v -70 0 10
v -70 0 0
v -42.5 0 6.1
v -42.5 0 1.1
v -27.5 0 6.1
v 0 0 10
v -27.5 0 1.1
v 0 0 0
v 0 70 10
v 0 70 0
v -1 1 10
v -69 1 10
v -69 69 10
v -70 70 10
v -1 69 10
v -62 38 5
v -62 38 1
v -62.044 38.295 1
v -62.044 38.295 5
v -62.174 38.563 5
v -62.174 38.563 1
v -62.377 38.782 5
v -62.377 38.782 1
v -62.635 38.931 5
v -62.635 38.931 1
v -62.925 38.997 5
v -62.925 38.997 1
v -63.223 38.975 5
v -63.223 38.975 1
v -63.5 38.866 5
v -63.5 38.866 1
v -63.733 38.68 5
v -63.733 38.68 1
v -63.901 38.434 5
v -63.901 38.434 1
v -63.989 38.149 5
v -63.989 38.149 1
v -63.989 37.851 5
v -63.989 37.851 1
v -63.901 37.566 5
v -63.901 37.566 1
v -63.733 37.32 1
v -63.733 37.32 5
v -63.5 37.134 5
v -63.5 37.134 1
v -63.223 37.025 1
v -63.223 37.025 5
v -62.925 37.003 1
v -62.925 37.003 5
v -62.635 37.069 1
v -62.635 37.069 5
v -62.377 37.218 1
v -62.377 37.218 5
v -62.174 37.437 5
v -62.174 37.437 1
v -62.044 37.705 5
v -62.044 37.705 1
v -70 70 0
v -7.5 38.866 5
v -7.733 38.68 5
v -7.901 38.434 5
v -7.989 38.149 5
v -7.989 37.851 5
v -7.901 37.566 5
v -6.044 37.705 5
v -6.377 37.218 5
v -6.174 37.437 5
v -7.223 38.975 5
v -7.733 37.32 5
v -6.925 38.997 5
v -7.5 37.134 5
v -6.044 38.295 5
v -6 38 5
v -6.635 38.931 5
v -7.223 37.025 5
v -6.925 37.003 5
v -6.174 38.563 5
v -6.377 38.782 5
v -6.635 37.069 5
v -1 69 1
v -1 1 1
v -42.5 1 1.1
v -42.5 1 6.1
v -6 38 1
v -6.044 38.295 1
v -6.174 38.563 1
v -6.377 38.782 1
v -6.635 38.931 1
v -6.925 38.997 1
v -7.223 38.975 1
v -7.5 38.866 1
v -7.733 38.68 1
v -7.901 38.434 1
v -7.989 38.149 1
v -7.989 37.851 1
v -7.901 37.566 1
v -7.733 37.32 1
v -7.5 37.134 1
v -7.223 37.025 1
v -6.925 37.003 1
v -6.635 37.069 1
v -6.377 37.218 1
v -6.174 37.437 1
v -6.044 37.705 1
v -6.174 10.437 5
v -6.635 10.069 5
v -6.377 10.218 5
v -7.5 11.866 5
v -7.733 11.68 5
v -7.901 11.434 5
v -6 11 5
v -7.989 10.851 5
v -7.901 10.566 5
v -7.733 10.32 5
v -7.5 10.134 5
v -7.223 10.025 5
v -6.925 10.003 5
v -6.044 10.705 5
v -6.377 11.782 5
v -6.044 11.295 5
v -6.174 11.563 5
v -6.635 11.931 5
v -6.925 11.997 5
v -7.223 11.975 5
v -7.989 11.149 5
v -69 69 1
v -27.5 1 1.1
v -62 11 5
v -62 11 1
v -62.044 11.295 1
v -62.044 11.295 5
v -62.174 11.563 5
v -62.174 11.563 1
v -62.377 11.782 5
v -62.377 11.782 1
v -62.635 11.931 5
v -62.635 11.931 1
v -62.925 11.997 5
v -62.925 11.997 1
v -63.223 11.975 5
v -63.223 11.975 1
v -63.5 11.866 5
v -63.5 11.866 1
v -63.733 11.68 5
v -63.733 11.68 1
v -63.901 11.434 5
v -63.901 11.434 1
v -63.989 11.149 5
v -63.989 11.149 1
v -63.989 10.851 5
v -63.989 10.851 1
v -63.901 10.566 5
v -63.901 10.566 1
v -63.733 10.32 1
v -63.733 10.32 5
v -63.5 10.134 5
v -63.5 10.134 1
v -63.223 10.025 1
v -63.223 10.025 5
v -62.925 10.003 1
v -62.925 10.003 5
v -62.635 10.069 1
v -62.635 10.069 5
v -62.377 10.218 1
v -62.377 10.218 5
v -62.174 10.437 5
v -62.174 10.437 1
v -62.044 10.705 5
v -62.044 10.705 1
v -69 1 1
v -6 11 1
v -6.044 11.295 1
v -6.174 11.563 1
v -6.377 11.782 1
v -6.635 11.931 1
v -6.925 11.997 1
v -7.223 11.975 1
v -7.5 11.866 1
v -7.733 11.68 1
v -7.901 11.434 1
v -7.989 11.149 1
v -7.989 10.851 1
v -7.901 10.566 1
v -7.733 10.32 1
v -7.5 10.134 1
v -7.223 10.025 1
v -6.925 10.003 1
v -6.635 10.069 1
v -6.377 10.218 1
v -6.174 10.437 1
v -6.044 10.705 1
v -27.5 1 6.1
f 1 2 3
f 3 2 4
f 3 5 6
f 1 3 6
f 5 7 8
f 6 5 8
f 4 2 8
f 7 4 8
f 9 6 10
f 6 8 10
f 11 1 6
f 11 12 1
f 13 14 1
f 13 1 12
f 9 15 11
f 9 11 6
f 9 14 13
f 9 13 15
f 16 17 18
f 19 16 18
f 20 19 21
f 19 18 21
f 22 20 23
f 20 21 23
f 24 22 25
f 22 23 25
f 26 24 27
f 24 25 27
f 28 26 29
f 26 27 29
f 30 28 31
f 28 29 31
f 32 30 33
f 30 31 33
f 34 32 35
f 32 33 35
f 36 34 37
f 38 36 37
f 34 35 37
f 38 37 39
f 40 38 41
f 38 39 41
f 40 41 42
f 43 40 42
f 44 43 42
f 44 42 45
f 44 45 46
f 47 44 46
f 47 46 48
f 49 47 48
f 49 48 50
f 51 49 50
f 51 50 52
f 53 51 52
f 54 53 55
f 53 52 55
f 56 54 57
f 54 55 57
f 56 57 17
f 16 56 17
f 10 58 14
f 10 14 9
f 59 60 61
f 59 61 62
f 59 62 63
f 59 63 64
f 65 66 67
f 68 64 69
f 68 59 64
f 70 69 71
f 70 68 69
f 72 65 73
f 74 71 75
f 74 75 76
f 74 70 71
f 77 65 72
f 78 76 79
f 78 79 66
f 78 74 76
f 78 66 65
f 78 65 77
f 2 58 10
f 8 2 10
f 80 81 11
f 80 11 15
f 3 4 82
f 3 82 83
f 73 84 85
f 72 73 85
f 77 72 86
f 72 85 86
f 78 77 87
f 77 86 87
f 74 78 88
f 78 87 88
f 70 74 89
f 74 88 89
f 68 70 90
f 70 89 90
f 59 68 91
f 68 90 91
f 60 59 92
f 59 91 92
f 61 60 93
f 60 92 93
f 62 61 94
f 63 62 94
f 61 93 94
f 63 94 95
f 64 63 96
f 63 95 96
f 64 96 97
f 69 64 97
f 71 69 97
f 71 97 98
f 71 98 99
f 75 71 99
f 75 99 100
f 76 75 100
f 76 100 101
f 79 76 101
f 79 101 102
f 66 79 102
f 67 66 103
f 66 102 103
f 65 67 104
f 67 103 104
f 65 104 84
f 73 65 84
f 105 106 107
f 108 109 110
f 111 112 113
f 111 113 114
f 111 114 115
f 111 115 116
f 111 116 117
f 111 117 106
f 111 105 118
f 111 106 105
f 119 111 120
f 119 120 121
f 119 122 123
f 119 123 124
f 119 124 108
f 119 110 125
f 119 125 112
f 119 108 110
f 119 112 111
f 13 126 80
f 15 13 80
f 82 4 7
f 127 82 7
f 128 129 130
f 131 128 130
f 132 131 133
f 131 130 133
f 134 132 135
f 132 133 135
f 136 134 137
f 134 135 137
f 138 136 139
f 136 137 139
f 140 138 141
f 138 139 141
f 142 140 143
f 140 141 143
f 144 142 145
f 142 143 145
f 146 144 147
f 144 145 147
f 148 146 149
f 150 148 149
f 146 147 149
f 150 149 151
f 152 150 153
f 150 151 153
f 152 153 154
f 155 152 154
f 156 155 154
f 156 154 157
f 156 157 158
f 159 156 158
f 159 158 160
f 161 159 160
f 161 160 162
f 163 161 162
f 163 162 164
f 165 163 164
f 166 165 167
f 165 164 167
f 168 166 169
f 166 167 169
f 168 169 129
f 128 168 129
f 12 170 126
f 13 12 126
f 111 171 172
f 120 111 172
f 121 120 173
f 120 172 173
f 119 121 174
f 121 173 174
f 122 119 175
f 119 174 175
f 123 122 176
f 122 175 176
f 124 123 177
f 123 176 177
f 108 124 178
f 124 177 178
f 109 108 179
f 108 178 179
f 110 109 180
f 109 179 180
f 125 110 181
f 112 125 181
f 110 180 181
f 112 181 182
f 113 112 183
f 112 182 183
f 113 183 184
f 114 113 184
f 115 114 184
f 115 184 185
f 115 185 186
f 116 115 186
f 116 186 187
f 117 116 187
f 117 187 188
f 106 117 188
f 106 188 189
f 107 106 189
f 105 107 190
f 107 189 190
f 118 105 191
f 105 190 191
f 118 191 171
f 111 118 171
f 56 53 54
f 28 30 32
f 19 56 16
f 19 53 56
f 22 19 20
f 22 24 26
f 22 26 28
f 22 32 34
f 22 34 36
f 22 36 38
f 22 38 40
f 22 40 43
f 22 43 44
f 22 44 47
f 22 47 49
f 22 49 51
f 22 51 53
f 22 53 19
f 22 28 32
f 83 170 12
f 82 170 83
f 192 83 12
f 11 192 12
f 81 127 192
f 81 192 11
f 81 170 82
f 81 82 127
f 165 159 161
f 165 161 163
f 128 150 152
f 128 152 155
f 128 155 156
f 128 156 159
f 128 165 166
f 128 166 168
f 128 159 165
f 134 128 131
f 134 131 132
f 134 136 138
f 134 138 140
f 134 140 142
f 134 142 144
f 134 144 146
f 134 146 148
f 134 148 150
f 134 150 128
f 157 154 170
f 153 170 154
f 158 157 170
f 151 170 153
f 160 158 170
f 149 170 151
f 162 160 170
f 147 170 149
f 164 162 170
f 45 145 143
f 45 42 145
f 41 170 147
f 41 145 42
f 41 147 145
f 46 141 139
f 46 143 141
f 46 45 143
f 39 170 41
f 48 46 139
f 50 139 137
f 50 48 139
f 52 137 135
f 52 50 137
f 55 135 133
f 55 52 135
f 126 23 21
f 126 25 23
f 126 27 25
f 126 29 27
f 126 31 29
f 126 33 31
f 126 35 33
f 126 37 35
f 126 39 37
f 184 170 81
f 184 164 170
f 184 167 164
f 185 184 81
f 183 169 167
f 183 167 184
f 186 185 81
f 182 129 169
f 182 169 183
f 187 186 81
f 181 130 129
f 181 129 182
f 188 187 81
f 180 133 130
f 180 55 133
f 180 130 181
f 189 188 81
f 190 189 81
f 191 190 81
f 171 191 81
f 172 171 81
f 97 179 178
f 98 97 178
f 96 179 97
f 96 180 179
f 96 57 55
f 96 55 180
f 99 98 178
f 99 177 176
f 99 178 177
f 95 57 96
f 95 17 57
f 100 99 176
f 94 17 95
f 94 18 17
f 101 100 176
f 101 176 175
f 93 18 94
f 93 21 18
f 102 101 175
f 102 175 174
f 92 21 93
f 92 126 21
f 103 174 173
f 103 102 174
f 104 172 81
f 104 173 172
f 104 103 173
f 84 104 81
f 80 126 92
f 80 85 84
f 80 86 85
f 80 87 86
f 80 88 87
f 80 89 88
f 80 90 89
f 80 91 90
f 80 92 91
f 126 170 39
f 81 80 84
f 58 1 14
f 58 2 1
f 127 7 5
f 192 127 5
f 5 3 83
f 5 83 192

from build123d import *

# Parameters (mm, degrees)
F0_W     = 70
F0_H     = 70
F1_DEPTH = 1
F2_W     = 70
F2_H     = 70
F2_W_2   = 68
F2_H_2   = 68
F3_DEPTH = 9
F4_W     = 15
F4_H     = 5
F5_DEPTH = 1
F6_R     = 1
F7_DEPTH = 4


with BuildPart() as f1:
    # F0 (on Top) → F1 (new body)
    with BuildSketch(Plane.XY):
        with Locations((-35, 35)):
            Rectangle(F0_W, F0_H)
    extrude(amount=F1_DEPTH)

    # F2 (on face) → F3 (join)
    with BuildSketch(Plane.XY.offset(1)):
        with Locations((-35, 35)):
            Rectangle(F2_W, F2_H)
        with Locations((-35, 35)):
            Rectangle(F2_W_2, F2_H_2, mode=Mode.SUBTRACT)
    extrude(amount=F3_DEPTH)

    # F4 (on face) → F5 (cut)
    with BuildSketch(Plane.XZ):
        with Locations((-35, 3.6)):
            Rectangle(F4_W, F4_H)
    extrude(amount=-F5_DEPTH, mode=Mode.SUBTRACT)

    # F6 (on face) → F7 (join)
    with BuildSketch(Plane.XY.offset(1)):
        with Locations((-63, 38)):
            Circle(F6_R)
        with Locations((-7, 38)):
            Circle(F6_R)
        with Locations((-7, 11)):
            Circle(F6_R)
        with Locations((-63, 11)):
            Circle(F6_R)
    extrude(amount=F7_DEPTH)


solid = f1.part
